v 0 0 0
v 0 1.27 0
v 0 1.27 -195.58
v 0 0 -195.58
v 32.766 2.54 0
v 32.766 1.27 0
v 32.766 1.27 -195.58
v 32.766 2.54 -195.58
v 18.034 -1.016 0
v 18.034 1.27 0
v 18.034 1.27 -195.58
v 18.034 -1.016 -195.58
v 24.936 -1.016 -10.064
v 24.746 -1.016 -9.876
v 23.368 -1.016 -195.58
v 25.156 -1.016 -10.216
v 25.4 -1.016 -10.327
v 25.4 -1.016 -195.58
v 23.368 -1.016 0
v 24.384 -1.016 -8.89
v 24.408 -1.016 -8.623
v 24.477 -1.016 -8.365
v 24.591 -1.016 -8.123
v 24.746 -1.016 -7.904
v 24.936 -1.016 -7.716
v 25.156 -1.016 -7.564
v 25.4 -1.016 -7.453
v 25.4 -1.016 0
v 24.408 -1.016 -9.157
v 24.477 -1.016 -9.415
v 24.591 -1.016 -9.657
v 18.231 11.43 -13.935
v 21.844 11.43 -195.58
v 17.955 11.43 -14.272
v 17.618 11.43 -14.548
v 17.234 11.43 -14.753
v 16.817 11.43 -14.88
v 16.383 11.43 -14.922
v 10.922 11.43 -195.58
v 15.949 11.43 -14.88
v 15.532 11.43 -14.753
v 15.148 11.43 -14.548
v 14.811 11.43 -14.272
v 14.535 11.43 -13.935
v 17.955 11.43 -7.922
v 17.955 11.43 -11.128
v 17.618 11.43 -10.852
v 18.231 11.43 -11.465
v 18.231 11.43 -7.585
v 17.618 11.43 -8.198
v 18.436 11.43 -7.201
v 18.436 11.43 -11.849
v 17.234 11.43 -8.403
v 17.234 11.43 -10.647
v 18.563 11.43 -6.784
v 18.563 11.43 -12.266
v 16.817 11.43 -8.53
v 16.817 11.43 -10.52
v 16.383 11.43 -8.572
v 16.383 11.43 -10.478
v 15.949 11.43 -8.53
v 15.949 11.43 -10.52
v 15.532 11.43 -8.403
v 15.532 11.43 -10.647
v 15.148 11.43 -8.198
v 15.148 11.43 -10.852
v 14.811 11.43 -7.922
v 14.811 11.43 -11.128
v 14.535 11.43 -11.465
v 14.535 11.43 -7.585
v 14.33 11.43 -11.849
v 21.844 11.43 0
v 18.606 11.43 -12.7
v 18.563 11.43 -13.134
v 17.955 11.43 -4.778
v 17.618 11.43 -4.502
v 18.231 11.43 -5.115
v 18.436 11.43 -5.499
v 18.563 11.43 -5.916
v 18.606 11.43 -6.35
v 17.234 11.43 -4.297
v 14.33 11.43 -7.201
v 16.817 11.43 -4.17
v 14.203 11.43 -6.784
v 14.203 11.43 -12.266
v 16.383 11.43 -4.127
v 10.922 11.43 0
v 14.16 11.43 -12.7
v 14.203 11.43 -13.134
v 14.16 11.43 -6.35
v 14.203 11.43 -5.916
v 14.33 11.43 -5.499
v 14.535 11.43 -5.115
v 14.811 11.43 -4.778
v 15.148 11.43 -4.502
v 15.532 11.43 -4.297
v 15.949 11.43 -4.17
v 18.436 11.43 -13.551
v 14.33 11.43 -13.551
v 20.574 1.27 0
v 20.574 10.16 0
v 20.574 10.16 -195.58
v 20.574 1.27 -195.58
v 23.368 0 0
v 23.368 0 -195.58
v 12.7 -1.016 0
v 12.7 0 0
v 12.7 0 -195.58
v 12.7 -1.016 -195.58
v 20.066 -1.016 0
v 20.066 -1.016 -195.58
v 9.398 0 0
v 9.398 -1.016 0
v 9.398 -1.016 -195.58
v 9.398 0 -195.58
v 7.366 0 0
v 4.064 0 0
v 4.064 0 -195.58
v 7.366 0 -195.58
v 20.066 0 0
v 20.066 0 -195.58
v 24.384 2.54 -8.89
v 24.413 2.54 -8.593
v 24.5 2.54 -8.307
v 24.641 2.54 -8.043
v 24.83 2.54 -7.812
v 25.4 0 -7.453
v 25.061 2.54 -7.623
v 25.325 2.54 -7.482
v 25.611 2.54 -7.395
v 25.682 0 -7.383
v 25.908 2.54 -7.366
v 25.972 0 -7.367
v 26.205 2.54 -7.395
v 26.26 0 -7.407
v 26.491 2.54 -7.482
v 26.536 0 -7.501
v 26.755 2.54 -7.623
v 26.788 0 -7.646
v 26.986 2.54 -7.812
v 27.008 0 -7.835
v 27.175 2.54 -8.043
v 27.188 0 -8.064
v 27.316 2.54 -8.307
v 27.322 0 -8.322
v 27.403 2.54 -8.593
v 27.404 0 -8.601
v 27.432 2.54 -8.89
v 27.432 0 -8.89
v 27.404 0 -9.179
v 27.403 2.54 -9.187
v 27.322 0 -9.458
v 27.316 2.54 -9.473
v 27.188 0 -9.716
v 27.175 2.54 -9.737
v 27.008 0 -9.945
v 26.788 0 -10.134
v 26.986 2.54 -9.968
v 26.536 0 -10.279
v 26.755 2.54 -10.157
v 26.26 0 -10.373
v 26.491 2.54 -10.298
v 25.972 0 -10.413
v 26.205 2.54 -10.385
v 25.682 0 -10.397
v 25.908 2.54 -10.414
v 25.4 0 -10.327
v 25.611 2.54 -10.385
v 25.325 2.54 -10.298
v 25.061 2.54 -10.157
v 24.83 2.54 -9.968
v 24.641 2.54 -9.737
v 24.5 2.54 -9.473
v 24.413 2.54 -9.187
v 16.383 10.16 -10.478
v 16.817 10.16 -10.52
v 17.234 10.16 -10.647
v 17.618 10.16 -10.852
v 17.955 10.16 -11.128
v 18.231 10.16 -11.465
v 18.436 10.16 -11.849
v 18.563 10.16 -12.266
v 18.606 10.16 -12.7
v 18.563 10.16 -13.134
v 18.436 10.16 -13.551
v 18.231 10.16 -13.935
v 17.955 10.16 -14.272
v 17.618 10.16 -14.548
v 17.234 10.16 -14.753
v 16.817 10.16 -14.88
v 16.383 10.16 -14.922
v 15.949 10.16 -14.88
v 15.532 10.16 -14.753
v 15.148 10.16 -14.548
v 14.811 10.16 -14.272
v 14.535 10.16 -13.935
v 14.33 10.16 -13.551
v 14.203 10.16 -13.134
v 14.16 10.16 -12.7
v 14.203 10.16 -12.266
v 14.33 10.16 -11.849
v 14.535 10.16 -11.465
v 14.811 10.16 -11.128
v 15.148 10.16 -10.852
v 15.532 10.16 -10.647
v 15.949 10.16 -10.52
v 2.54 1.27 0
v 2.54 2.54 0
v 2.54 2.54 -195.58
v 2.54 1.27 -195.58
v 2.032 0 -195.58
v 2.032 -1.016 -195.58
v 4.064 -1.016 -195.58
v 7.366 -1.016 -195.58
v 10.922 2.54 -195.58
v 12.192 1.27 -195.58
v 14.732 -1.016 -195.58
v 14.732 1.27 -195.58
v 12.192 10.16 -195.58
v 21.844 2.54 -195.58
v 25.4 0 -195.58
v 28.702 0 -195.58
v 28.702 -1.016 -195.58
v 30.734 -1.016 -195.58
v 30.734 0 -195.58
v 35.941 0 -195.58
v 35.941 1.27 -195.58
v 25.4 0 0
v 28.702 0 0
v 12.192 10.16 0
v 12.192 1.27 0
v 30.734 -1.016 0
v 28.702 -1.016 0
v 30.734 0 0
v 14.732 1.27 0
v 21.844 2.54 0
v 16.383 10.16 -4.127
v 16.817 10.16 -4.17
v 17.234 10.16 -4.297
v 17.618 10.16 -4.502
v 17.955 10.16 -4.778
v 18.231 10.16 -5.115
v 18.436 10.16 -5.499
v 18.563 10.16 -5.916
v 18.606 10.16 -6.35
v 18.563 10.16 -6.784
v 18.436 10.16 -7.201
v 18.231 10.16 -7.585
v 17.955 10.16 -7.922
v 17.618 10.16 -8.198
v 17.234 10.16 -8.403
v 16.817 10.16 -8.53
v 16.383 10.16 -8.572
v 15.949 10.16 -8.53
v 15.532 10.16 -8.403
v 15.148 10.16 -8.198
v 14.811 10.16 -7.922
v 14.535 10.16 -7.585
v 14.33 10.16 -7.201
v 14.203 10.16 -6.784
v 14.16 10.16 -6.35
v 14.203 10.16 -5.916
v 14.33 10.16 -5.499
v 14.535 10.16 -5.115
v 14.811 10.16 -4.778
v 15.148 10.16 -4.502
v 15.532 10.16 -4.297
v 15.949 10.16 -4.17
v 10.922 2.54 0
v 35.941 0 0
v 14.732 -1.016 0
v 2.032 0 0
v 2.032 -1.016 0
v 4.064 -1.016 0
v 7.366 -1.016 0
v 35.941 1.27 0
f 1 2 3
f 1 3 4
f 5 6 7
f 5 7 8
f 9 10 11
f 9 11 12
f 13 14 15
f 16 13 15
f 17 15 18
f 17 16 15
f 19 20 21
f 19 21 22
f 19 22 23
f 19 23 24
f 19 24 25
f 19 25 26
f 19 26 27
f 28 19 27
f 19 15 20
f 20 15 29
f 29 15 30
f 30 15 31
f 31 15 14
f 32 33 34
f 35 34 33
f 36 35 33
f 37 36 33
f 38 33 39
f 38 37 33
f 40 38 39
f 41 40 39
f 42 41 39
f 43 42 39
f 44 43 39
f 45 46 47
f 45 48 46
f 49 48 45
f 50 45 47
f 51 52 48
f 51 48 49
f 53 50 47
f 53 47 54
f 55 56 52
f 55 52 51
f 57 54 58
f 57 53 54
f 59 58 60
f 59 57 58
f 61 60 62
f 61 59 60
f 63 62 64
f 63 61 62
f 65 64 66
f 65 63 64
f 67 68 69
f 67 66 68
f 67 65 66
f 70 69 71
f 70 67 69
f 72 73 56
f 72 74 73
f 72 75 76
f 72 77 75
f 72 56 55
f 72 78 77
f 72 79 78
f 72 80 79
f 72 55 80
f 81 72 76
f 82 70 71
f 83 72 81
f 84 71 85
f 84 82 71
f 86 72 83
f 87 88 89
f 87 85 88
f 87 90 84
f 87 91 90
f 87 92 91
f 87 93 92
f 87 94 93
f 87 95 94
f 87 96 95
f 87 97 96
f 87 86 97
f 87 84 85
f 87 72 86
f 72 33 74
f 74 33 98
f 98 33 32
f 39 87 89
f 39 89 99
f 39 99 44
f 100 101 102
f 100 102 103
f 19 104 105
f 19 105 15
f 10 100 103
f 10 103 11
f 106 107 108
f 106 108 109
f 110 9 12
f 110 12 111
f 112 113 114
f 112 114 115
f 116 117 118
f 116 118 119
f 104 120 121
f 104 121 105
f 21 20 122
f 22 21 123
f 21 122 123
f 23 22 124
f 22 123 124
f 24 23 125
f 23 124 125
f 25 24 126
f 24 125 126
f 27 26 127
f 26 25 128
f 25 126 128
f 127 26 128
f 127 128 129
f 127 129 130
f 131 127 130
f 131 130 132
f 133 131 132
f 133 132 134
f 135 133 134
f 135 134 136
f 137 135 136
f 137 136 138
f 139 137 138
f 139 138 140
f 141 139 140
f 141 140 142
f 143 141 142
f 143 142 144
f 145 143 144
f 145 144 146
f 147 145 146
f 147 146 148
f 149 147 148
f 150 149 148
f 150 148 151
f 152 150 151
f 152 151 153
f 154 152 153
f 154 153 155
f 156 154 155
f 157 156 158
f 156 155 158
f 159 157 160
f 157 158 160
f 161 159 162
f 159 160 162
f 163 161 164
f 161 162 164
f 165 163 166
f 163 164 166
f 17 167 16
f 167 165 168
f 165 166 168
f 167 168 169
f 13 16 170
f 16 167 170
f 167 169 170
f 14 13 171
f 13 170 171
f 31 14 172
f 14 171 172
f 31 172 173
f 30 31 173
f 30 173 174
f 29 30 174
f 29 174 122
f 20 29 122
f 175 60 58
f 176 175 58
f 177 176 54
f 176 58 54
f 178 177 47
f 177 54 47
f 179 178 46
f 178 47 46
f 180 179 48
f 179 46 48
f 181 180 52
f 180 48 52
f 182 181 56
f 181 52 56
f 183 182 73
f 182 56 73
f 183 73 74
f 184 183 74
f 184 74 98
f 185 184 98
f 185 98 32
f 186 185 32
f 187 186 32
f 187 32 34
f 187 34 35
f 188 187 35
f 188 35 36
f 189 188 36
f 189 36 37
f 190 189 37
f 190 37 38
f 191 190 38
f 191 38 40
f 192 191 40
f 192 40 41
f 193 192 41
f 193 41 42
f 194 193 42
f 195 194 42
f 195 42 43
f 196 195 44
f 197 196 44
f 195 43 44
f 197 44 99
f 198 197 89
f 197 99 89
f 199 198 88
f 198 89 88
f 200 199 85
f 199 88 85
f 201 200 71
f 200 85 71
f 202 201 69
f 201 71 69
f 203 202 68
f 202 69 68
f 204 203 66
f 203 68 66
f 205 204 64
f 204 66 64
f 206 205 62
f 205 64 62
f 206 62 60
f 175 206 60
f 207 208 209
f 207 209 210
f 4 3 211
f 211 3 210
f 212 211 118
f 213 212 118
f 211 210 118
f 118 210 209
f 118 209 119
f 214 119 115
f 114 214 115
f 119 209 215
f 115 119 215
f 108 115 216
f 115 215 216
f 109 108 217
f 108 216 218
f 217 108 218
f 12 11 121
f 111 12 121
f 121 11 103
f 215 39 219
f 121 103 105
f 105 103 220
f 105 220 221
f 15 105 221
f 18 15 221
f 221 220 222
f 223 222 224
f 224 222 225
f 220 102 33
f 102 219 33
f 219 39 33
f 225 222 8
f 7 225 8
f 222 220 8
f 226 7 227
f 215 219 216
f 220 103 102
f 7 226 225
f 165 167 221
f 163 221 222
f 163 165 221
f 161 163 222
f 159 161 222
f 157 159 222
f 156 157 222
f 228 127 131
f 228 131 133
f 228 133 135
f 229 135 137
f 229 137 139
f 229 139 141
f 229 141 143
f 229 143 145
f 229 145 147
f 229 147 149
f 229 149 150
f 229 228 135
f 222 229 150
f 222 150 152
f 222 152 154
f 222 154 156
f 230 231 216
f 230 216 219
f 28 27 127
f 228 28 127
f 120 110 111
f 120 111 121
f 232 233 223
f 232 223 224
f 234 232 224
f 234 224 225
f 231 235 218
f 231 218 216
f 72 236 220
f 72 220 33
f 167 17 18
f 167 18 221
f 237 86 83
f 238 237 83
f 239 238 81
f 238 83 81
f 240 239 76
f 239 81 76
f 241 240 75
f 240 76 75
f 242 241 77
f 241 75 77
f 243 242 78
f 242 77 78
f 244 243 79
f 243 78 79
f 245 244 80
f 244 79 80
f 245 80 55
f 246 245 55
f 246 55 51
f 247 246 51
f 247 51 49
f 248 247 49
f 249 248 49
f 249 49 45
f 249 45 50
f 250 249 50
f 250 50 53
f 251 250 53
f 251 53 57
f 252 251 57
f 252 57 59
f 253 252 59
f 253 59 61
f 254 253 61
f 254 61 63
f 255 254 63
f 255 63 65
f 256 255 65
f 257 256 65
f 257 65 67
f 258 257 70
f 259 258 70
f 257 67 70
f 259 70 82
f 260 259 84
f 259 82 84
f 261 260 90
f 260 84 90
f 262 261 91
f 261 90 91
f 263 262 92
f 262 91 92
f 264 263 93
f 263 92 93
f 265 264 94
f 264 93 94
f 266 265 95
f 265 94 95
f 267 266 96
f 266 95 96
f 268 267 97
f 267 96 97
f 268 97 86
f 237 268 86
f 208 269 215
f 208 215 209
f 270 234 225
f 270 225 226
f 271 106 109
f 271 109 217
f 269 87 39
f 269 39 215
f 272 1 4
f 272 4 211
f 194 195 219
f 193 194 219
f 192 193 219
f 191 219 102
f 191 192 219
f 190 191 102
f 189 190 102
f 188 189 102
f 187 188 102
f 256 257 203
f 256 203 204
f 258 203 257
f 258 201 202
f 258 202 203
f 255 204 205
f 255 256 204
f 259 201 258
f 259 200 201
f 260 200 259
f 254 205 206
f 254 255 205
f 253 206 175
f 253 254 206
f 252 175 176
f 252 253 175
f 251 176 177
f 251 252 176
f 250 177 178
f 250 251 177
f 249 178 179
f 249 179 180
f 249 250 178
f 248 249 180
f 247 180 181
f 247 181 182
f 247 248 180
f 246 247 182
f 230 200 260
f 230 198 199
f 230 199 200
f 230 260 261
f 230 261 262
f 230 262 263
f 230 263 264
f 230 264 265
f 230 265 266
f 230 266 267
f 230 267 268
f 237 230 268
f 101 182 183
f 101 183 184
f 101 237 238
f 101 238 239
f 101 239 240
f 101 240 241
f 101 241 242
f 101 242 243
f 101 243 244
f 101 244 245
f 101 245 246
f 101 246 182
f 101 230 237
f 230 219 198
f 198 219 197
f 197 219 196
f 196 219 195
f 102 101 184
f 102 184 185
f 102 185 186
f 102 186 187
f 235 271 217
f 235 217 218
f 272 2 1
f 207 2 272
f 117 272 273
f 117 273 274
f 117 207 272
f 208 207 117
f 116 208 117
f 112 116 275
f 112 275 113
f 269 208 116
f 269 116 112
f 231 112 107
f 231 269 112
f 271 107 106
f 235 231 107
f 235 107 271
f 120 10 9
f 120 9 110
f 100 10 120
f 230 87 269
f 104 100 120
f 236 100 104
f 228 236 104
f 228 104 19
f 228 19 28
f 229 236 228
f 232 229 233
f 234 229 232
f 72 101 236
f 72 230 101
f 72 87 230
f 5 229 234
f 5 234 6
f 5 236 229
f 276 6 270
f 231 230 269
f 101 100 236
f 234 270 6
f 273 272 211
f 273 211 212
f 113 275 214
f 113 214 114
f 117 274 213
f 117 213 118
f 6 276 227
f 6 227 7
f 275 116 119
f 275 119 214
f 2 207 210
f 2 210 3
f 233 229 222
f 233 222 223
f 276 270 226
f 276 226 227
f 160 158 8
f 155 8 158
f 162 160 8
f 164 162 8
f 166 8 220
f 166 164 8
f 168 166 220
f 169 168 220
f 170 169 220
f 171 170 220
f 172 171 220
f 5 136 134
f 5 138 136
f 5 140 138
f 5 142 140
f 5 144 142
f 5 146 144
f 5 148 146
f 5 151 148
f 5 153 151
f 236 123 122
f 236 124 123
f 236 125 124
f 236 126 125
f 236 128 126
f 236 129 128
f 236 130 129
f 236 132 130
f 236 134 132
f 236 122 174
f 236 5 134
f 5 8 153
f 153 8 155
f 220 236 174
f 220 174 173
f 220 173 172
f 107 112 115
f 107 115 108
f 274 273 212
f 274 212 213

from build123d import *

# Parameters (mm, degrees)
BOSS_EXTRUDE1_DEPTH = 195.58
CUT_EXTRUDE1_REACH  = 201.244
SKETCH2_R           = 2.2225
SKETCH5_R           = 1.524
CUT_EXTRUDE4_DEPTH  = 200.053570631


with BuildPart() as part:
    # Sketch1 → Boss-Extrude1 (new body)
    with BuildSketch(Plane.XY):
        Polygon((0, 0), (2.032, 0), (2.032, -1.016), (4.064, -1.016), (4.064, 0), (7.366, 0), (7.366, -1.016), (9.398, -1.016), (9.398, 0), (12.7, 0), (12.7, -1.016), (14.732, -1.016), (14.732, 0), (14.732, 1.27), (12.192, 1.27), (12.192, 10.16), (20.574, 10.16), (20.574, 1.27), (18.034, 1.27), (18.034, 0), (18.034, -1.016), (20.066, -1.016), (20.066, 0), (23.368, 0), (23.368, -1.016), (25.4, -1.016), (25.4, 0), (28.702, 0), (28.702, -1.016), (30.734, -1.016), (30.734, 0), (32.766, 0), (35.941, 0), (35.941, 1.27), (32.766, 1.27), (32.766, 2.54), (30.226, 2.54), (21.844, 2.54), (21.844, 11.43), (10.922, 11.43), (10.922, 2.54), (2.54, 2.54), (2.54, 1.27), (0, 1.27), align=None)
    extrude(amount=-BOSS_EXTRUDE1_DEPTH)

    # Sketch2 → Cut-Extrude1 (cut, up to next)
    with BuildSketch(Plane(origin=(0, 11.43, 0), x_dir=(1, 0, 0), z_dir=(0, 1, 0)), mode=Mode.PRIVATE) as cut_extrude1_sk1:
        with Locations(Location((16.383, 6.35, 0), (0, 0, 270))):
            Circle(SKETCH2_R)
    cut_extrude1_tool1 = extrude(cut_extrude1_sk1.sketch, amount=-CUT_EXTRUDE1_REACH, mode=Mode.PRIVATE) & part.part
    # Sketch2 → Cut-Extrude1 (cut, up to next)
    with BuildSketch(Plane(origin=(0, 11.43, 0), x_dir=(1, 0, 0), z_dir=(0, 1, 0)), mode=Mode.PRIVATE) as cut_extrude1_sk2:
        with Locations(Location((16.383, 12.7, 0), (0, 0, 270))):
            Circle(SKETCH2_R)
    cut_extrude1_tool2 = extrude(cut_extrude1_sk2.sketch, amount=-CUT_EXTRUDE1_REACH, mode=Mode.PRIVATE) & part.part
    add(cut_extrude1_tool1.solids().sort_by_distance((16.383, 11.43, -6.35))[0], mode=Mode.SUBTRACT)
    add(cut_extrude1_tool2.solids().sort_by_distance((16.383, 11.43, -12.7))[0], mode=Mode.SUBTRACT)

    # Sketch5 → Cut-Extrude4 (cut, through all)
    with BuildSketch(Plane(origin=(0, 2.54, 0), x_dir=(1, 0, 0), z_dir=(0, 1, 0))):
        with Locations(Location((25.908, 8.89, 0), (0, 0, 180))):
            Circle(SKETCH5_R)
    extrude(amount=-CUT_EXTRUDE4_DEPTH, mode=Mode.SUBTRACT)


solid = part.part
